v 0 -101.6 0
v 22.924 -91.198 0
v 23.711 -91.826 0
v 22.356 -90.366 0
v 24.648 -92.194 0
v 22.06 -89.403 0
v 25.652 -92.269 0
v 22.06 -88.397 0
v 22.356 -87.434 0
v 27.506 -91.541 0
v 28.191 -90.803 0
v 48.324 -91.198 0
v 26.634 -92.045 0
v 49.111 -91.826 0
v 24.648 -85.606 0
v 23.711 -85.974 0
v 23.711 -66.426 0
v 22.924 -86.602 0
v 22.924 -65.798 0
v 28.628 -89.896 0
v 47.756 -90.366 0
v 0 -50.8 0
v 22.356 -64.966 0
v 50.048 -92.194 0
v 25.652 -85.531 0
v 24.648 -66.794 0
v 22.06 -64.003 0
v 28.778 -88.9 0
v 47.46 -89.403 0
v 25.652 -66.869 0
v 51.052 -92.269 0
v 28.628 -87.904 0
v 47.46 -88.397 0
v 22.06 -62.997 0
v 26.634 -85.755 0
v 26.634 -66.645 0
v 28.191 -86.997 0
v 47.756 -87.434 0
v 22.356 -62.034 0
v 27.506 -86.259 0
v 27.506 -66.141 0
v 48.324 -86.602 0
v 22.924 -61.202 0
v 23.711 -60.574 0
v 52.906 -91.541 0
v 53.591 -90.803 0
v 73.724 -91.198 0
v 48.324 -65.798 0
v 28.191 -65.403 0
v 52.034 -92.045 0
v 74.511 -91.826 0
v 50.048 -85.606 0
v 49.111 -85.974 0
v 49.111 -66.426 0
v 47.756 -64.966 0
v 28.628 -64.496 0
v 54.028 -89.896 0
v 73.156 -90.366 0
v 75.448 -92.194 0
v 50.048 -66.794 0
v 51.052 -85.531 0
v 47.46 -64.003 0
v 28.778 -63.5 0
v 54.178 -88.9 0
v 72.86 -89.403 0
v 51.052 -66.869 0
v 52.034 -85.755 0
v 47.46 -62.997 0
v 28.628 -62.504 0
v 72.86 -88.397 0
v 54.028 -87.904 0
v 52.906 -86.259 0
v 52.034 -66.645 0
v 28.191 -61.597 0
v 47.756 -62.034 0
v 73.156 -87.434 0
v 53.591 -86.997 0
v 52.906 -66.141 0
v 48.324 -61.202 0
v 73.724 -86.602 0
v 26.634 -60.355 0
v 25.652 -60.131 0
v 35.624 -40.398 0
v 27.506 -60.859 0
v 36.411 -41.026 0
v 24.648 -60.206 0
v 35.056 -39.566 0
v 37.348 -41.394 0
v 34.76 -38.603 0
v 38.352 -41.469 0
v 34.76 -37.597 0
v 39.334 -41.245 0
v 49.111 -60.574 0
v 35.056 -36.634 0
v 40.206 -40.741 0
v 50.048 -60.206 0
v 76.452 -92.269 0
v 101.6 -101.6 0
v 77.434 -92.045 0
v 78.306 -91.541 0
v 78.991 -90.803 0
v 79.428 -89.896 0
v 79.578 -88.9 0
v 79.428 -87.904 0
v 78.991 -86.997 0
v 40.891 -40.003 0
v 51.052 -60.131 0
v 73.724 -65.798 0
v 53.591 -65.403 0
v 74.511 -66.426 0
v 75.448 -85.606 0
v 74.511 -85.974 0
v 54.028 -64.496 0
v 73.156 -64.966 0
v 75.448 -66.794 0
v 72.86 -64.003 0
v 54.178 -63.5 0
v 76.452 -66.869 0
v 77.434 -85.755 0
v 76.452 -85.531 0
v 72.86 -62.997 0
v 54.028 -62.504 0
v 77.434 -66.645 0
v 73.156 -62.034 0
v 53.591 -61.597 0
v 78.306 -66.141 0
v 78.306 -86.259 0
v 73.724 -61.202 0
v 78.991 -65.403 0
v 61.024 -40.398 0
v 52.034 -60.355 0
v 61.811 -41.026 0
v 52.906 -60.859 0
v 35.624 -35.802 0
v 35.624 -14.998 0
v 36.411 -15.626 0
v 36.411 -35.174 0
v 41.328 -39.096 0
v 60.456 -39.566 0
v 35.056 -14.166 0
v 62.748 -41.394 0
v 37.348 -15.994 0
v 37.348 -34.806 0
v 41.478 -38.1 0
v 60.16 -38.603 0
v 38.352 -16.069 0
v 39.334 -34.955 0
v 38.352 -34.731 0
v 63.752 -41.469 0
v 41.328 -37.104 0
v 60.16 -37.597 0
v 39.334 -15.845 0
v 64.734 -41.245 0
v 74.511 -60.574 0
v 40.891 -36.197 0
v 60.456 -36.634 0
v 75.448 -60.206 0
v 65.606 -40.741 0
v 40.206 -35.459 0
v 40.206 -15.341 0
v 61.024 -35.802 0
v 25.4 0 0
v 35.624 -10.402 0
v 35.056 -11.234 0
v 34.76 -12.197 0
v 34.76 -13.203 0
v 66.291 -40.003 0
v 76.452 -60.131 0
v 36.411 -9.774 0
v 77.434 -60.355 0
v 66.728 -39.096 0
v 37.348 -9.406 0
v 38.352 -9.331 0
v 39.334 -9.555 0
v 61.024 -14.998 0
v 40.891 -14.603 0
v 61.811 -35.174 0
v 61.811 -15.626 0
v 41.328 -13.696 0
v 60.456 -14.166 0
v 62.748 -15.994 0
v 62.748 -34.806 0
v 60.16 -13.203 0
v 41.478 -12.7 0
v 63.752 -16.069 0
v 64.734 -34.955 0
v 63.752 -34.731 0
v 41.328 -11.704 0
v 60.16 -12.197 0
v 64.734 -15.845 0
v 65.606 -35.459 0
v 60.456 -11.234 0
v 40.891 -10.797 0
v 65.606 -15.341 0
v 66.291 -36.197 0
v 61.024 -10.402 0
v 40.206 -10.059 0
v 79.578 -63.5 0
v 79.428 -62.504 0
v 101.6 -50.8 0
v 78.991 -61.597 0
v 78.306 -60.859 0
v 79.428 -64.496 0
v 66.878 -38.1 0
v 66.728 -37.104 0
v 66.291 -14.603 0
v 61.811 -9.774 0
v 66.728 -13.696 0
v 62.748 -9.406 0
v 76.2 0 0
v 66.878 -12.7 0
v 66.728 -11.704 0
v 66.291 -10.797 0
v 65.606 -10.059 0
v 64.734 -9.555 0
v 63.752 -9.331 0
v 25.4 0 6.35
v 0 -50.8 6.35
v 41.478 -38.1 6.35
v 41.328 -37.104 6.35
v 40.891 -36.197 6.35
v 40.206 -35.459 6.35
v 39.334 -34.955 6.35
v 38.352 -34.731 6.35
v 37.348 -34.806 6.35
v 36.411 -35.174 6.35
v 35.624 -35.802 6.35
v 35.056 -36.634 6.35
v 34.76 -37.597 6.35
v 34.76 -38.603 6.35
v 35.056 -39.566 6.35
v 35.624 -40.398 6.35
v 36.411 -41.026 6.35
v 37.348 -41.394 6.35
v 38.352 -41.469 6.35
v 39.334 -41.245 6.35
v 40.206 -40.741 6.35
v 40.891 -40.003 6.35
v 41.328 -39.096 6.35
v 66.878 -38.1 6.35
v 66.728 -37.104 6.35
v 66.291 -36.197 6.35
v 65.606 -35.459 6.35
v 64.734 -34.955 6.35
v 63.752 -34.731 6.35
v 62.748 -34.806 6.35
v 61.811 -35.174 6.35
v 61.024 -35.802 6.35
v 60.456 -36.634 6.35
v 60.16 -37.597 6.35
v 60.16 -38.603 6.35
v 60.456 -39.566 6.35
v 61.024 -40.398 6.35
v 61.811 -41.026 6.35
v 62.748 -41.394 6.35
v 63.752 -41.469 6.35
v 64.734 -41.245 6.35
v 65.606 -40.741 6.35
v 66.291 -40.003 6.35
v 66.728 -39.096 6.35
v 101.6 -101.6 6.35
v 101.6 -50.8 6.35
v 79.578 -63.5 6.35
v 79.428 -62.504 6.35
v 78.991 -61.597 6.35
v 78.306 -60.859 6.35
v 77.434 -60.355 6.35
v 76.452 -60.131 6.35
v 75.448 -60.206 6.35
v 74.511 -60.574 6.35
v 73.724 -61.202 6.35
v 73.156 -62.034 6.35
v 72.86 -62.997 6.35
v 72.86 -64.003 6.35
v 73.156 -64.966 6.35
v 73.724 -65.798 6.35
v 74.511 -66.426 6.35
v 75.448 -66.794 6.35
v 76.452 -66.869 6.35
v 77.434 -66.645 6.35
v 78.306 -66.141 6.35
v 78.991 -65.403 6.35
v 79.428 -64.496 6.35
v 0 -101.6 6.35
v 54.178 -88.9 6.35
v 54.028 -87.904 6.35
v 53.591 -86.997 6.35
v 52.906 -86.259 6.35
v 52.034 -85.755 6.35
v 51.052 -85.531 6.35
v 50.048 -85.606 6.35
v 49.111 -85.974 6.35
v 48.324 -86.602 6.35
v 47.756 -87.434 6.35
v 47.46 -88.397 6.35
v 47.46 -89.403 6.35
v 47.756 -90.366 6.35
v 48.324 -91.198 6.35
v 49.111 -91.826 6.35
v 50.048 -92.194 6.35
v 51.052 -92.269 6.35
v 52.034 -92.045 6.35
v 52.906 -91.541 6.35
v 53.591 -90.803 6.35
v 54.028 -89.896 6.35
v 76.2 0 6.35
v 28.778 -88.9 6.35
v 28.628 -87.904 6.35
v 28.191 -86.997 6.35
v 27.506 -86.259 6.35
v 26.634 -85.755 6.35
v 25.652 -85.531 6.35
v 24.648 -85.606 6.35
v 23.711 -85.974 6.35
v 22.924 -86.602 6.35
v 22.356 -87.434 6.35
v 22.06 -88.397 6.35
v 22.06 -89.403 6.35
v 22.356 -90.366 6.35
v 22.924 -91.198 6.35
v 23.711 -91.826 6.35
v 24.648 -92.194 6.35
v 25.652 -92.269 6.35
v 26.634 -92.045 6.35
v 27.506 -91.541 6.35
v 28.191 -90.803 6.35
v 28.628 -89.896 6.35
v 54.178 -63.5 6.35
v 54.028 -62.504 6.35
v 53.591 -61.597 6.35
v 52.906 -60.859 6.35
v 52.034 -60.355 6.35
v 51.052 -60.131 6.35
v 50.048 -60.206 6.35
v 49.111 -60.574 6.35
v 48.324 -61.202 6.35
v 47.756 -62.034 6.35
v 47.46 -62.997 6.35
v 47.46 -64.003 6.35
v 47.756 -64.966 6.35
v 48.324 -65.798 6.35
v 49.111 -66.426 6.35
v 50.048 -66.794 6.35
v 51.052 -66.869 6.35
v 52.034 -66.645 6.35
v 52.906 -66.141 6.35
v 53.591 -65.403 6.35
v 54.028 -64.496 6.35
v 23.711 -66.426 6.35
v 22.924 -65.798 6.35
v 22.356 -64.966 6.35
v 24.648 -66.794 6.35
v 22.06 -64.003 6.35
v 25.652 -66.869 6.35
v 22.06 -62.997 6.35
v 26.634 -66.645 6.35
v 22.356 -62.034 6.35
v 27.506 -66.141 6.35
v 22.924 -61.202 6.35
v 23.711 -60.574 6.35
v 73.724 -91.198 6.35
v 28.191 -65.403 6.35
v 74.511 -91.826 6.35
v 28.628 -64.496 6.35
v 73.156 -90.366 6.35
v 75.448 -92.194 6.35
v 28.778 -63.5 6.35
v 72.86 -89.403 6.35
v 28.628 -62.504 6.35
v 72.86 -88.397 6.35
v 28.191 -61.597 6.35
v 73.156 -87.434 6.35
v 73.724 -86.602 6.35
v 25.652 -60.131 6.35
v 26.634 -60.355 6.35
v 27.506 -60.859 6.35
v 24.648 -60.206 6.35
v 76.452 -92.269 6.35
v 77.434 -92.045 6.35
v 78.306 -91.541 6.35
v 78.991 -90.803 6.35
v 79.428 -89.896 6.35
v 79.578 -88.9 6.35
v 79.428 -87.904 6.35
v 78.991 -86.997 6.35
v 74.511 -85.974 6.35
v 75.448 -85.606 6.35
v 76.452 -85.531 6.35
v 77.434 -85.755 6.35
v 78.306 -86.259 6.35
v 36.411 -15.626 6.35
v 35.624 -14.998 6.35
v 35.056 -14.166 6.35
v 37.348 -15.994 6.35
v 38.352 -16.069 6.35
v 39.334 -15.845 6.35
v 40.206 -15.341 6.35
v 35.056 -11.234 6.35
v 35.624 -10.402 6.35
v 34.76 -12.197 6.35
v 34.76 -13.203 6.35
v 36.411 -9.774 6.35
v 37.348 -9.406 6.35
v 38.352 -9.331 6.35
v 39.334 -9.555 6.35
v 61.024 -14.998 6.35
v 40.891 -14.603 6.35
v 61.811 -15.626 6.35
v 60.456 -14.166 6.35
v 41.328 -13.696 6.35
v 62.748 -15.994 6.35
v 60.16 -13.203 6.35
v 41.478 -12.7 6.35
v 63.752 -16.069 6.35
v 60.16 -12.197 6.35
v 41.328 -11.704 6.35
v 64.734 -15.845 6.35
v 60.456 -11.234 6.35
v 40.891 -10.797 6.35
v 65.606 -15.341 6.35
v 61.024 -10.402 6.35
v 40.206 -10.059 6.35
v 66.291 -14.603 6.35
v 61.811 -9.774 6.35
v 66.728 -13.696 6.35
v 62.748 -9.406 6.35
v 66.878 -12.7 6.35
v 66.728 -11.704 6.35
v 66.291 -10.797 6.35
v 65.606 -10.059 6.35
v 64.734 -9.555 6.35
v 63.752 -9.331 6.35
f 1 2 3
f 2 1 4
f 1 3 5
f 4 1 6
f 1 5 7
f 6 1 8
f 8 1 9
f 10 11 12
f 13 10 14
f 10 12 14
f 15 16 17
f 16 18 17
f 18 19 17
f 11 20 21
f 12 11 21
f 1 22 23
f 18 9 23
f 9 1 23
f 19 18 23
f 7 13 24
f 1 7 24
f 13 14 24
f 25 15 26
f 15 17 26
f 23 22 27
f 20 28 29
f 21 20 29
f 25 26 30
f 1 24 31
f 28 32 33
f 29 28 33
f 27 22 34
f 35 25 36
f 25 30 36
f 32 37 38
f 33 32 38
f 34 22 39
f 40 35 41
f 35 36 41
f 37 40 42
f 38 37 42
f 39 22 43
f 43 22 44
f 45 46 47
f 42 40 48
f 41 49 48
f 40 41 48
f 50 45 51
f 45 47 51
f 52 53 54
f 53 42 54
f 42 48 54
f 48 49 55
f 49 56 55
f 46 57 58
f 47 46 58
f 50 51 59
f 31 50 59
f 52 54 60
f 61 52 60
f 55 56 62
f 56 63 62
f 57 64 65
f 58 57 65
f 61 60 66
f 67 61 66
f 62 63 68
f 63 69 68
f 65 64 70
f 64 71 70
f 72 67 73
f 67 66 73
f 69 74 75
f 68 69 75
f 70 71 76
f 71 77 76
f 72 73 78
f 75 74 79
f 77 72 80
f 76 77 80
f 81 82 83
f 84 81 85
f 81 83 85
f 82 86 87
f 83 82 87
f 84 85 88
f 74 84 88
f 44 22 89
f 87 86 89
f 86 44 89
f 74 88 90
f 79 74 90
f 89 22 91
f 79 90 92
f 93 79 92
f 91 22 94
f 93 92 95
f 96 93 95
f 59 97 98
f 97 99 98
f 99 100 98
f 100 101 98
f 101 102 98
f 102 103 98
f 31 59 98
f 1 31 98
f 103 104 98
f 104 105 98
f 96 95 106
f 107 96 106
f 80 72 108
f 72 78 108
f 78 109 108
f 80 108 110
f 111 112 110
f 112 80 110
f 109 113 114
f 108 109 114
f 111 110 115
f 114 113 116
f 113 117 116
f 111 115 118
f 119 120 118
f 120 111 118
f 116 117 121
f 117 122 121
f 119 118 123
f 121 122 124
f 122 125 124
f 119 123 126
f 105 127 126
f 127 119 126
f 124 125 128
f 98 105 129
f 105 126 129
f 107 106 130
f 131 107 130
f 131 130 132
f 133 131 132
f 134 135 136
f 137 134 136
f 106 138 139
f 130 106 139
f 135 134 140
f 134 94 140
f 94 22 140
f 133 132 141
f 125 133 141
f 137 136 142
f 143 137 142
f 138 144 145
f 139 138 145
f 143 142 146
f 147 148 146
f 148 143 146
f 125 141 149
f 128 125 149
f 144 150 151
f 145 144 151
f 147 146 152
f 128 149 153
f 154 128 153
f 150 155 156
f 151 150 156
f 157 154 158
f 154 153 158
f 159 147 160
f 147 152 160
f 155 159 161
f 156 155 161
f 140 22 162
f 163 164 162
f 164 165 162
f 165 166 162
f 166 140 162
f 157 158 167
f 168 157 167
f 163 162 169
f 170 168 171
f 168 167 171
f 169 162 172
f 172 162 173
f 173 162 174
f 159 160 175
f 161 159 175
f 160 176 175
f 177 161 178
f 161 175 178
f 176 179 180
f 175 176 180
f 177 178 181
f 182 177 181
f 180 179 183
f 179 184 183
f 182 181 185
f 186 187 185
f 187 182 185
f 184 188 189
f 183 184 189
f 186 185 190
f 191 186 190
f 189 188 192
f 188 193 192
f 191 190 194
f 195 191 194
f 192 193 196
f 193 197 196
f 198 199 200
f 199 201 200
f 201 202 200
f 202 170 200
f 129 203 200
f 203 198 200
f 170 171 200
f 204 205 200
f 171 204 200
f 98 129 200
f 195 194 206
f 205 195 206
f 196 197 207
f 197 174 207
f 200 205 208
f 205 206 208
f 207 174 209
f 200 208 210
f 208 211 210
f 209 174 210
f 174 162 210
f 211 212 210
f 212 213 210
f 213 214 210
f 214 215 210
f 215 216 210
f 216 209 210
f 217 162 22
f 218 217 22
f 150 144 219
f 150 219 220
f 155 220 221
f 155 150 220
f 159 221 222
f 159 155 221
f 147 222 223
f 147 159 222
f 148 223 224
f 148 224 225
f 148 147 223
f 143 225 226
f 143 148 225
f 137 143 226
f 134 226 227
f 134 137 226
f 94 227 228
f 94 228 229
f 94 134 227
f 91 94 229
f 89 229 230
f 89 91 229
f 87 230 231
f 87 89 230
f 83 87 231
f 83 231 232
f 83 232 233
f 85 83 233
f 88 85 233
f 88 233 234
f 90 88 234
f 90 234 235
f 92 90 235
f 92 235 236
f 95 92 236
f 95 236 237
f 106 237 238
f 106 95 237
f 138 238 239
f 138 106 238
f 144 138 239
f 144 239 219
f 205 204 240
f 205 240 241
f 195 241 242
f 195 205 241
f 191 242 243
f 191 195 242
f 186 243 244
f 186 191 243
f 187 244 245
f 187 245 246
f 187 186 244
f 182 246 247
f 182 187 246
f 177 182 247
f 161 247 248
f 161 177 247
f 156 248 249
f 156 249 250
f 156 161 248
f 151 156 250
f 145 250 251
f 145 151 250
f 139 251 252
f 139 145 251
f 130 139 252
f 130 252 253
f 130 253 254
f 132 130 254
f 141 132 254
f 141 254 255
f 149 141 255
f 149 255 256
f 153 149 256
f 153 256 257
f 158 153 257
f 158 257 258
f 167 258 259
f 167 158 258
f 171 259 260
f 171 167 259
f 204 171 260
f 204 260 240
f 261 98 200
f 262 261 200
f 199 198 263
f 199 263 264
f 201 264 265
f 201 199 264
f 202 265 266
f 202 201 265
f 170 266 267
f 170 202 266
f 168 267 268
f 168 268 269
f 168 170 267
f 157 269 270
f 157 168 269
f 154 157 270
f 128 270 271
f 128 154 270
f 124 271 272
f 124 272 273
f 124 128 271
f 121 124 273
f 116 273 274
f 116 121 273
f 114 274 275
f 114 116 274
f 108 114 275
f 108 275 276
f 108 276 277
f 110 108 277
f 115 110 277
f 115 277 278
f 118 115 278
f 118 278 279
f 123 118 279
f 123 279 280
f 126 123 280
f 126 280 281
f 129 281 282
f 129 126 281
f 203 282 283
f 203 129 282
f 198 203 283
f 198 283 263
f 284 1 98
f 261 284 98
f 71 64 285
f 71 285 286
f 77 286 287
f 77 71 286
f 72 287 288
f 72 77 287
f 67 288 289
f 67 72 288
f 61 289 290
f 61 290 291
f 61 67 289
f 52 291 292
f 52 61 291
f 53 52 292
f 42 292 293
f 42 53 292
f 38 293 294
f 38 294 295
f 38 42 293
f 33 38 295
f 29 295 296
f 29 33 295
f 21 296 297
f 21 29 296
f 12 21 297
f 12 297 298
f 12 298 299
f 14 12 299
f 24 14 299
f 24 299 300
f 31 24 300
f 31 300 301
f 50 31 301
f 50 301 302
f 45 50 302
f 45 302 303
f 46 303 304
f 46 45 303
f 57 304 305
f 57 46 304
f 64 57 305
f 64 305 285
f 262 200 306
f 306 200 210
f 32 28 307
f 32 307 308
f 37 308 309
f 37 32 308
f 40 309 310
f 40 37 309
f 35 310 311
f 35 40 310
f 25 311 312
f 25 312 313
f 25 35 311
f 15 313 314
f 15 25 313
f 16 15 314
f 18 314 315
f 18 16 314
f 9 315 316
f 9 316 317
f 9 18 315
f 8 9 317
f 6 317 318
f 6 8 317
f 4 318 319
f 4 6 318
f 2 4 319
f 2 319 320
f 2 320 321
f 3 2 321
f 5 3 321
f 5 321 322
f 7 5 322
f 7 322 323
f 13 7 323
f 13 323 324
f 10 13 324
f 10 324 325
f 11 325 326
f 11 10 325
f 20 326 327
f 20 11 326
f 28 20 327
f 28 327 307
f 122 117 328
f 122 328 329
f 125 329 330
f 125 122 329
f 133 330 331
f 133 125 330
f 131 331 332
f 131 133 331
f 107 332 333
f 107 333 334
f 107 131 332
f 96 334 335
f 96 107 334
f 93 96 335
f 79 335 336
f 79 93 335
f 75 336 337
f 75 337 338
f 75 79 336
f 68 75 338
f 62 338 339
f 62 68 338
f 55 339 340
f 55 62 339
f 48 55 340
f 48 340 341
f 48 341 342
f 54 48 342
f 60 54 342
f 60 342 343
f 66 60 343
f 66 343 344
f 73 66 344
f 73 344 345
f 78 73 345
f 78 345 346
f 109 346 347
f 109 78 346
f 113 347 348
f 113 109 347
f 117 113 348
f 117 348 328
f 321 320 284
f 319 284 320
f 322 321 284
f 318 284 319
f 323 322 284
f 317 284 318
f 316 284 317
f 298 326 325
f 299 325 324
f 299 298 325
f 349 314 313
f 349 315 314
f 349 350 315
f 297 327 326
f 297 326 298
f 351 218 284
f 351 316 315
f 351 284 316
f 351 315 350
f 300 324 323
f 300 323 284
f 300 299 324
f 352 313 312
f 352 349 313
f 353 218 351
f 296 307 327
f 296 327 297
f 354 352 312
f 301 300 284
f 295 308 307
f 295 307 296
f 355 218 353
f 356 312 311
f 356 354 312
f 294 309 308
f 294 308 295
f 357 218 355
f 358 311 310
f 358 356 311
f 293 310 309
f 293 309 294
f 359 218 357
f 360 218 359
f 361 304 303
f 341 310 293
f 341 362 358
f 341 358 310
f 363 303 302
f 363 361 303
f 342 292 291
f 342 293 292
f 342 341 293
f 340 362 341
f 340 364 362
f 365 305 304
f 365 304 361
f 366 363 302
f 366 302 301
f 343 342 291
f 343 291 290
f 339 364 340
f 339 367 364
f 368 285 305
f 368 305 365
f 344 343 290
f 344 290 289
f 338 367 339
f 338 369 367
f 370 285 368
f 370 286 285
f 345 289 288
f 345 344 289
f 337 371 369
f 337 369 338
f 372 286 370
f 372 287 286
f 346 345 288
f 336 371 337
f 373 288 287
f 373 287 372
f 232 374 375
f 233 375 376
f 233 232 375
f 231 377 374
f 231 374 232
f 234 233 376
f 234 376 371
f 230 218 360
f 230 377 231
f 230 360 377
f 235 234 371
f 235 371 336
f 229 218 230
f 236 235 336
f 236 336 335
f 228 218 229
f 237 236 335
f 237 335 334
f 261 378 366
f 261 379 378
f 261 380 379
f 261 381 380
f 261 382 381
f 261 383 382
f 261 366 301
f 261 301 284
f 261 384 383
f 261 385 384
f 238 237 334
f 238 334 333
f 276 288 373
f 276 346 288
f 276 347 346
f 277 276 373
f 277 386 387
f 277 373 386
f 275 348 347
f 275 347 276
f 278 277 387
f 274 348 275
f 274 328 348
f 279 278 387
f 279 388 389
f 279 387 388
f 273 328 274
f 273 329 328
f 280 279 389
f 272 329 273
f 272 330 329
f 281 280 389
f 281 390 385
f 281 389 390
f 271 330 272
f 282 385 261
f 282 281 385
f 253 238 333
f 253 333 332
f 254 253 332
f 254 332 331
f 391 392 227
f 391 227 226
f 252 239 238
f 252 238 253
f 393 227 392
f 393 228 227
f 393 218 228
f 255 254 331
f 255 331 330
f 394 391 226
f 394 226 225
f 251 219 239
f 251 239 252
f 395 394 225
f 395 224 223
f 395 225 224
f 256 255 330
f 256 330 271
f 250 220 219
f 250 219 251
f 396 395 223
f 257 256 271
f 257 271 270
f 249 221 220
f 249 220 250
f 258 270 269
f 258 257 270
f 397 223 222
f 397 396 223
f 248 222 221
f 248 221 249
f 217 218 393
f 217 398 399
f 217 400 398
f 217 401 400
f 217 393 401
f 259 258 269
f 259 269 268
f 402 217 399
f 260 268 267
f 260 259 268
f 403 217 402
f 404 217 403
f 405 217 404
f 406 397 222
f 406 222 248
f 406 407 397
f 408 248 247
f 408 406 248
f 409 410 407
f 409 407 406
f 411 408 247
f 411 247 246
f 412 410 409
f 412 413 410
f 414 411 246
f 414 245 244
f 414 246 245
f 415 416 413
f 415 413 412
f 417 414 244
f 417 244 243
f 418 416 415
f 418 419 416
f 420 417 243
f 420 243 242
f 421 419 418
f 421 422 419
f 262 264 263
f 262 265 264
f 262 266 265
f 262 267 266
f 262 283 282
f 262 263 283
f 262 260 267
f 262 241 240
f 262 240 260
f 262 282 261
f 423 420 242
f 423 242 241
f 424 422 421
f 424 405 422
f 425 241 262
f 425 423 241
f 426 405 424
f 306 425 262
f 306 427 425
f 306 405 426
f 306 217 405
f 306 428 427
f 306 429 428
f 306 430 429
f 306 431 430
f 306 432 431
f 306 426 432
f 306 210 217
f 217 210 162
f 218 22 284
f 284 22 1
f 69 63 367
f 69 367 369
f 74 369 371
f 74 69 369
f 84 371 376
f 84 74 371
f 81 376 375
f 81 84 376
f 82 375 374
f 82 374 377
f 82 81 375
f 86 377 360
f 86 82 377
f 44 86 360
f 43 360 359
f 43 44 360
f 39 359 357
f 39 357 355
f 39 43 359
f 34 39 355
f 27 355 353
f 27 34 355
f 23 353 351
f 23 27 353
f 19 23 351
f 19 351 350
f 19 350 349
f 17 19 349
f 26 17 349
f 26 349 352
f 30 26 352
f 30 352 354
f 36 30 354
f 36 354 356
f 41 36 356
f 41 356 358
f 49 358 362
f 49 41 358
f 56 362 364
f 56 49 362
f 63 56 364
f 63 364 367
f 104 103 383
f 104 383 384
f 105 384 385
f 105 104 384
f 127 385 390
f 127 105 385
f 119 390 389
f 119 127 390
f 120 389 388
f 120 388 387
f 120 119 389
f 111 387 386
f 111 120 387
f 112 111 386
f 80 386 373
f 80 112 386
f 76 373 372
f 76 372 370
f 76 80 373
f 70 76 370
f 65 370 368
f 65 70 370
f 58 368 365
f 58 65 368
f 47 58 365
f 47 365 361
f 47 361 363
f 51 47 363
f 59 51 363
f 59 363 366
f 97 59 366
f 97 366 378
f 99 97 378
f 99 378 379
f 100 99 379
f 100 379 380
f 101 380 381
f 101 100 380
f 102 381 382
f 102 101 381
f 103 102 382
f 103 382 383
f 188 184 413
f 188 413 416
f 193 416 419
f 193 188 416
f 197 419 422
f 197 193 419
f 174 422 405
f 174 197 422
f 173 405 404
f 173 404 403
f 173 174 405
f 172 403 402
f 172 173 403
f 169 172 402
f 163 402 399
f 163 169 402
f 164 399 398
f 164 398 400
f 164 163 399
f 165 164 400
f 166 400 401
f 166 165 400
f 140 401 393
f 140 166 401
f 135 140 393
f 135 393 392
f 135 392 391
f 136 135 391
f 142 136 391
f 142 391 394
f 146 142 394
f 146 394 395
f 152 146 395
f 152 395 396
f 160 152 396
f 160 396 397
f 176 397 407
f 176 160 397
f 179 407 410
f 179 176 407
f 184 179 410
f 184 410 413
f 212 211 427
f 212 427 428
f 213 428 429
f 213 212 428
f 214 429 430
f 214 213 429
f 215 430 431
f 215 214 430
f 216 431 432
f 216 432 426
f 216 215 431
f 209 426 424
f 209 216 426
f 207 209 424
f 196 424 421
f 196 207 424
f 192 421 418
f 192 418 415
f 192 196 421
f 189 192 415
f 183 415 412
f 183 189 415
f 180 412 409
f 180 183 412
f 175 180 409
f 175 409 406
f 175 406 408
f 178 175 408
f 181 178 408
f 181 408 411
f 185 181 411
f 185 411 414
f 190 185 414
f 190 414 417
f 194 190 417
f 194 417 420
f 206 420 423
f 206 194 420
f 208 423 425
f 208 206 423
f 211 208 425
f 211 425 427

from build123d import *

# Parameters (mm, degrees)
F0_R     = 3.3782
F1_DEPTH = 6.35


with BuildPart() as f1:
    # F0 (on Top) → F1 (new body)
    with BuildSketch(Plane.XY):
        Polygon((76.2, 0), (25.4, 0), (0, -50.8), (0, -101.6), (101.6, -101.6), (101.6, -50.8), align=None)
        with Locations((25.4, -88.9)):
            Circle(F0_R, mode=Mode.SUBTRACT)
        with Locations((50.8, -88.9)):
            Circle(F0_R, mode=Mode.SUBTRACT)
        with Locations((25.4, -63.5)):
            Circle(F0_R, mode=Mode.SUBTRACT)
        with Locations((50.8, -63.5)):
            Circle(F0_R, mode=Mode.SUBTRACT)
        with Locations((76.2, -88.9)):
            Circle(F0_R, mode=Mode.SUBTRACT)
        with Locations((76.2, -63.5)):
            Circle(F0_R, mode=Mode.SUBTRACT)
        with Locations((38.1, -38.1)):
            Circle(F0_R, mode=Mode.SUBTRACT)
        with Locations((38.1, -12.7)):
            Circle(F0_R, mode=Mode.SUBTRACT)
        with Locations((63.5, -38.1)):
            Circle(F0_R, mode=Mode.SUBTRACT)
        with Locations((63.5, -12.7)):
            Circle(F0_R, mode=Mode.SUBTRACT)
    extrude(amount=F1_DEPTH)


solid = f1.part
